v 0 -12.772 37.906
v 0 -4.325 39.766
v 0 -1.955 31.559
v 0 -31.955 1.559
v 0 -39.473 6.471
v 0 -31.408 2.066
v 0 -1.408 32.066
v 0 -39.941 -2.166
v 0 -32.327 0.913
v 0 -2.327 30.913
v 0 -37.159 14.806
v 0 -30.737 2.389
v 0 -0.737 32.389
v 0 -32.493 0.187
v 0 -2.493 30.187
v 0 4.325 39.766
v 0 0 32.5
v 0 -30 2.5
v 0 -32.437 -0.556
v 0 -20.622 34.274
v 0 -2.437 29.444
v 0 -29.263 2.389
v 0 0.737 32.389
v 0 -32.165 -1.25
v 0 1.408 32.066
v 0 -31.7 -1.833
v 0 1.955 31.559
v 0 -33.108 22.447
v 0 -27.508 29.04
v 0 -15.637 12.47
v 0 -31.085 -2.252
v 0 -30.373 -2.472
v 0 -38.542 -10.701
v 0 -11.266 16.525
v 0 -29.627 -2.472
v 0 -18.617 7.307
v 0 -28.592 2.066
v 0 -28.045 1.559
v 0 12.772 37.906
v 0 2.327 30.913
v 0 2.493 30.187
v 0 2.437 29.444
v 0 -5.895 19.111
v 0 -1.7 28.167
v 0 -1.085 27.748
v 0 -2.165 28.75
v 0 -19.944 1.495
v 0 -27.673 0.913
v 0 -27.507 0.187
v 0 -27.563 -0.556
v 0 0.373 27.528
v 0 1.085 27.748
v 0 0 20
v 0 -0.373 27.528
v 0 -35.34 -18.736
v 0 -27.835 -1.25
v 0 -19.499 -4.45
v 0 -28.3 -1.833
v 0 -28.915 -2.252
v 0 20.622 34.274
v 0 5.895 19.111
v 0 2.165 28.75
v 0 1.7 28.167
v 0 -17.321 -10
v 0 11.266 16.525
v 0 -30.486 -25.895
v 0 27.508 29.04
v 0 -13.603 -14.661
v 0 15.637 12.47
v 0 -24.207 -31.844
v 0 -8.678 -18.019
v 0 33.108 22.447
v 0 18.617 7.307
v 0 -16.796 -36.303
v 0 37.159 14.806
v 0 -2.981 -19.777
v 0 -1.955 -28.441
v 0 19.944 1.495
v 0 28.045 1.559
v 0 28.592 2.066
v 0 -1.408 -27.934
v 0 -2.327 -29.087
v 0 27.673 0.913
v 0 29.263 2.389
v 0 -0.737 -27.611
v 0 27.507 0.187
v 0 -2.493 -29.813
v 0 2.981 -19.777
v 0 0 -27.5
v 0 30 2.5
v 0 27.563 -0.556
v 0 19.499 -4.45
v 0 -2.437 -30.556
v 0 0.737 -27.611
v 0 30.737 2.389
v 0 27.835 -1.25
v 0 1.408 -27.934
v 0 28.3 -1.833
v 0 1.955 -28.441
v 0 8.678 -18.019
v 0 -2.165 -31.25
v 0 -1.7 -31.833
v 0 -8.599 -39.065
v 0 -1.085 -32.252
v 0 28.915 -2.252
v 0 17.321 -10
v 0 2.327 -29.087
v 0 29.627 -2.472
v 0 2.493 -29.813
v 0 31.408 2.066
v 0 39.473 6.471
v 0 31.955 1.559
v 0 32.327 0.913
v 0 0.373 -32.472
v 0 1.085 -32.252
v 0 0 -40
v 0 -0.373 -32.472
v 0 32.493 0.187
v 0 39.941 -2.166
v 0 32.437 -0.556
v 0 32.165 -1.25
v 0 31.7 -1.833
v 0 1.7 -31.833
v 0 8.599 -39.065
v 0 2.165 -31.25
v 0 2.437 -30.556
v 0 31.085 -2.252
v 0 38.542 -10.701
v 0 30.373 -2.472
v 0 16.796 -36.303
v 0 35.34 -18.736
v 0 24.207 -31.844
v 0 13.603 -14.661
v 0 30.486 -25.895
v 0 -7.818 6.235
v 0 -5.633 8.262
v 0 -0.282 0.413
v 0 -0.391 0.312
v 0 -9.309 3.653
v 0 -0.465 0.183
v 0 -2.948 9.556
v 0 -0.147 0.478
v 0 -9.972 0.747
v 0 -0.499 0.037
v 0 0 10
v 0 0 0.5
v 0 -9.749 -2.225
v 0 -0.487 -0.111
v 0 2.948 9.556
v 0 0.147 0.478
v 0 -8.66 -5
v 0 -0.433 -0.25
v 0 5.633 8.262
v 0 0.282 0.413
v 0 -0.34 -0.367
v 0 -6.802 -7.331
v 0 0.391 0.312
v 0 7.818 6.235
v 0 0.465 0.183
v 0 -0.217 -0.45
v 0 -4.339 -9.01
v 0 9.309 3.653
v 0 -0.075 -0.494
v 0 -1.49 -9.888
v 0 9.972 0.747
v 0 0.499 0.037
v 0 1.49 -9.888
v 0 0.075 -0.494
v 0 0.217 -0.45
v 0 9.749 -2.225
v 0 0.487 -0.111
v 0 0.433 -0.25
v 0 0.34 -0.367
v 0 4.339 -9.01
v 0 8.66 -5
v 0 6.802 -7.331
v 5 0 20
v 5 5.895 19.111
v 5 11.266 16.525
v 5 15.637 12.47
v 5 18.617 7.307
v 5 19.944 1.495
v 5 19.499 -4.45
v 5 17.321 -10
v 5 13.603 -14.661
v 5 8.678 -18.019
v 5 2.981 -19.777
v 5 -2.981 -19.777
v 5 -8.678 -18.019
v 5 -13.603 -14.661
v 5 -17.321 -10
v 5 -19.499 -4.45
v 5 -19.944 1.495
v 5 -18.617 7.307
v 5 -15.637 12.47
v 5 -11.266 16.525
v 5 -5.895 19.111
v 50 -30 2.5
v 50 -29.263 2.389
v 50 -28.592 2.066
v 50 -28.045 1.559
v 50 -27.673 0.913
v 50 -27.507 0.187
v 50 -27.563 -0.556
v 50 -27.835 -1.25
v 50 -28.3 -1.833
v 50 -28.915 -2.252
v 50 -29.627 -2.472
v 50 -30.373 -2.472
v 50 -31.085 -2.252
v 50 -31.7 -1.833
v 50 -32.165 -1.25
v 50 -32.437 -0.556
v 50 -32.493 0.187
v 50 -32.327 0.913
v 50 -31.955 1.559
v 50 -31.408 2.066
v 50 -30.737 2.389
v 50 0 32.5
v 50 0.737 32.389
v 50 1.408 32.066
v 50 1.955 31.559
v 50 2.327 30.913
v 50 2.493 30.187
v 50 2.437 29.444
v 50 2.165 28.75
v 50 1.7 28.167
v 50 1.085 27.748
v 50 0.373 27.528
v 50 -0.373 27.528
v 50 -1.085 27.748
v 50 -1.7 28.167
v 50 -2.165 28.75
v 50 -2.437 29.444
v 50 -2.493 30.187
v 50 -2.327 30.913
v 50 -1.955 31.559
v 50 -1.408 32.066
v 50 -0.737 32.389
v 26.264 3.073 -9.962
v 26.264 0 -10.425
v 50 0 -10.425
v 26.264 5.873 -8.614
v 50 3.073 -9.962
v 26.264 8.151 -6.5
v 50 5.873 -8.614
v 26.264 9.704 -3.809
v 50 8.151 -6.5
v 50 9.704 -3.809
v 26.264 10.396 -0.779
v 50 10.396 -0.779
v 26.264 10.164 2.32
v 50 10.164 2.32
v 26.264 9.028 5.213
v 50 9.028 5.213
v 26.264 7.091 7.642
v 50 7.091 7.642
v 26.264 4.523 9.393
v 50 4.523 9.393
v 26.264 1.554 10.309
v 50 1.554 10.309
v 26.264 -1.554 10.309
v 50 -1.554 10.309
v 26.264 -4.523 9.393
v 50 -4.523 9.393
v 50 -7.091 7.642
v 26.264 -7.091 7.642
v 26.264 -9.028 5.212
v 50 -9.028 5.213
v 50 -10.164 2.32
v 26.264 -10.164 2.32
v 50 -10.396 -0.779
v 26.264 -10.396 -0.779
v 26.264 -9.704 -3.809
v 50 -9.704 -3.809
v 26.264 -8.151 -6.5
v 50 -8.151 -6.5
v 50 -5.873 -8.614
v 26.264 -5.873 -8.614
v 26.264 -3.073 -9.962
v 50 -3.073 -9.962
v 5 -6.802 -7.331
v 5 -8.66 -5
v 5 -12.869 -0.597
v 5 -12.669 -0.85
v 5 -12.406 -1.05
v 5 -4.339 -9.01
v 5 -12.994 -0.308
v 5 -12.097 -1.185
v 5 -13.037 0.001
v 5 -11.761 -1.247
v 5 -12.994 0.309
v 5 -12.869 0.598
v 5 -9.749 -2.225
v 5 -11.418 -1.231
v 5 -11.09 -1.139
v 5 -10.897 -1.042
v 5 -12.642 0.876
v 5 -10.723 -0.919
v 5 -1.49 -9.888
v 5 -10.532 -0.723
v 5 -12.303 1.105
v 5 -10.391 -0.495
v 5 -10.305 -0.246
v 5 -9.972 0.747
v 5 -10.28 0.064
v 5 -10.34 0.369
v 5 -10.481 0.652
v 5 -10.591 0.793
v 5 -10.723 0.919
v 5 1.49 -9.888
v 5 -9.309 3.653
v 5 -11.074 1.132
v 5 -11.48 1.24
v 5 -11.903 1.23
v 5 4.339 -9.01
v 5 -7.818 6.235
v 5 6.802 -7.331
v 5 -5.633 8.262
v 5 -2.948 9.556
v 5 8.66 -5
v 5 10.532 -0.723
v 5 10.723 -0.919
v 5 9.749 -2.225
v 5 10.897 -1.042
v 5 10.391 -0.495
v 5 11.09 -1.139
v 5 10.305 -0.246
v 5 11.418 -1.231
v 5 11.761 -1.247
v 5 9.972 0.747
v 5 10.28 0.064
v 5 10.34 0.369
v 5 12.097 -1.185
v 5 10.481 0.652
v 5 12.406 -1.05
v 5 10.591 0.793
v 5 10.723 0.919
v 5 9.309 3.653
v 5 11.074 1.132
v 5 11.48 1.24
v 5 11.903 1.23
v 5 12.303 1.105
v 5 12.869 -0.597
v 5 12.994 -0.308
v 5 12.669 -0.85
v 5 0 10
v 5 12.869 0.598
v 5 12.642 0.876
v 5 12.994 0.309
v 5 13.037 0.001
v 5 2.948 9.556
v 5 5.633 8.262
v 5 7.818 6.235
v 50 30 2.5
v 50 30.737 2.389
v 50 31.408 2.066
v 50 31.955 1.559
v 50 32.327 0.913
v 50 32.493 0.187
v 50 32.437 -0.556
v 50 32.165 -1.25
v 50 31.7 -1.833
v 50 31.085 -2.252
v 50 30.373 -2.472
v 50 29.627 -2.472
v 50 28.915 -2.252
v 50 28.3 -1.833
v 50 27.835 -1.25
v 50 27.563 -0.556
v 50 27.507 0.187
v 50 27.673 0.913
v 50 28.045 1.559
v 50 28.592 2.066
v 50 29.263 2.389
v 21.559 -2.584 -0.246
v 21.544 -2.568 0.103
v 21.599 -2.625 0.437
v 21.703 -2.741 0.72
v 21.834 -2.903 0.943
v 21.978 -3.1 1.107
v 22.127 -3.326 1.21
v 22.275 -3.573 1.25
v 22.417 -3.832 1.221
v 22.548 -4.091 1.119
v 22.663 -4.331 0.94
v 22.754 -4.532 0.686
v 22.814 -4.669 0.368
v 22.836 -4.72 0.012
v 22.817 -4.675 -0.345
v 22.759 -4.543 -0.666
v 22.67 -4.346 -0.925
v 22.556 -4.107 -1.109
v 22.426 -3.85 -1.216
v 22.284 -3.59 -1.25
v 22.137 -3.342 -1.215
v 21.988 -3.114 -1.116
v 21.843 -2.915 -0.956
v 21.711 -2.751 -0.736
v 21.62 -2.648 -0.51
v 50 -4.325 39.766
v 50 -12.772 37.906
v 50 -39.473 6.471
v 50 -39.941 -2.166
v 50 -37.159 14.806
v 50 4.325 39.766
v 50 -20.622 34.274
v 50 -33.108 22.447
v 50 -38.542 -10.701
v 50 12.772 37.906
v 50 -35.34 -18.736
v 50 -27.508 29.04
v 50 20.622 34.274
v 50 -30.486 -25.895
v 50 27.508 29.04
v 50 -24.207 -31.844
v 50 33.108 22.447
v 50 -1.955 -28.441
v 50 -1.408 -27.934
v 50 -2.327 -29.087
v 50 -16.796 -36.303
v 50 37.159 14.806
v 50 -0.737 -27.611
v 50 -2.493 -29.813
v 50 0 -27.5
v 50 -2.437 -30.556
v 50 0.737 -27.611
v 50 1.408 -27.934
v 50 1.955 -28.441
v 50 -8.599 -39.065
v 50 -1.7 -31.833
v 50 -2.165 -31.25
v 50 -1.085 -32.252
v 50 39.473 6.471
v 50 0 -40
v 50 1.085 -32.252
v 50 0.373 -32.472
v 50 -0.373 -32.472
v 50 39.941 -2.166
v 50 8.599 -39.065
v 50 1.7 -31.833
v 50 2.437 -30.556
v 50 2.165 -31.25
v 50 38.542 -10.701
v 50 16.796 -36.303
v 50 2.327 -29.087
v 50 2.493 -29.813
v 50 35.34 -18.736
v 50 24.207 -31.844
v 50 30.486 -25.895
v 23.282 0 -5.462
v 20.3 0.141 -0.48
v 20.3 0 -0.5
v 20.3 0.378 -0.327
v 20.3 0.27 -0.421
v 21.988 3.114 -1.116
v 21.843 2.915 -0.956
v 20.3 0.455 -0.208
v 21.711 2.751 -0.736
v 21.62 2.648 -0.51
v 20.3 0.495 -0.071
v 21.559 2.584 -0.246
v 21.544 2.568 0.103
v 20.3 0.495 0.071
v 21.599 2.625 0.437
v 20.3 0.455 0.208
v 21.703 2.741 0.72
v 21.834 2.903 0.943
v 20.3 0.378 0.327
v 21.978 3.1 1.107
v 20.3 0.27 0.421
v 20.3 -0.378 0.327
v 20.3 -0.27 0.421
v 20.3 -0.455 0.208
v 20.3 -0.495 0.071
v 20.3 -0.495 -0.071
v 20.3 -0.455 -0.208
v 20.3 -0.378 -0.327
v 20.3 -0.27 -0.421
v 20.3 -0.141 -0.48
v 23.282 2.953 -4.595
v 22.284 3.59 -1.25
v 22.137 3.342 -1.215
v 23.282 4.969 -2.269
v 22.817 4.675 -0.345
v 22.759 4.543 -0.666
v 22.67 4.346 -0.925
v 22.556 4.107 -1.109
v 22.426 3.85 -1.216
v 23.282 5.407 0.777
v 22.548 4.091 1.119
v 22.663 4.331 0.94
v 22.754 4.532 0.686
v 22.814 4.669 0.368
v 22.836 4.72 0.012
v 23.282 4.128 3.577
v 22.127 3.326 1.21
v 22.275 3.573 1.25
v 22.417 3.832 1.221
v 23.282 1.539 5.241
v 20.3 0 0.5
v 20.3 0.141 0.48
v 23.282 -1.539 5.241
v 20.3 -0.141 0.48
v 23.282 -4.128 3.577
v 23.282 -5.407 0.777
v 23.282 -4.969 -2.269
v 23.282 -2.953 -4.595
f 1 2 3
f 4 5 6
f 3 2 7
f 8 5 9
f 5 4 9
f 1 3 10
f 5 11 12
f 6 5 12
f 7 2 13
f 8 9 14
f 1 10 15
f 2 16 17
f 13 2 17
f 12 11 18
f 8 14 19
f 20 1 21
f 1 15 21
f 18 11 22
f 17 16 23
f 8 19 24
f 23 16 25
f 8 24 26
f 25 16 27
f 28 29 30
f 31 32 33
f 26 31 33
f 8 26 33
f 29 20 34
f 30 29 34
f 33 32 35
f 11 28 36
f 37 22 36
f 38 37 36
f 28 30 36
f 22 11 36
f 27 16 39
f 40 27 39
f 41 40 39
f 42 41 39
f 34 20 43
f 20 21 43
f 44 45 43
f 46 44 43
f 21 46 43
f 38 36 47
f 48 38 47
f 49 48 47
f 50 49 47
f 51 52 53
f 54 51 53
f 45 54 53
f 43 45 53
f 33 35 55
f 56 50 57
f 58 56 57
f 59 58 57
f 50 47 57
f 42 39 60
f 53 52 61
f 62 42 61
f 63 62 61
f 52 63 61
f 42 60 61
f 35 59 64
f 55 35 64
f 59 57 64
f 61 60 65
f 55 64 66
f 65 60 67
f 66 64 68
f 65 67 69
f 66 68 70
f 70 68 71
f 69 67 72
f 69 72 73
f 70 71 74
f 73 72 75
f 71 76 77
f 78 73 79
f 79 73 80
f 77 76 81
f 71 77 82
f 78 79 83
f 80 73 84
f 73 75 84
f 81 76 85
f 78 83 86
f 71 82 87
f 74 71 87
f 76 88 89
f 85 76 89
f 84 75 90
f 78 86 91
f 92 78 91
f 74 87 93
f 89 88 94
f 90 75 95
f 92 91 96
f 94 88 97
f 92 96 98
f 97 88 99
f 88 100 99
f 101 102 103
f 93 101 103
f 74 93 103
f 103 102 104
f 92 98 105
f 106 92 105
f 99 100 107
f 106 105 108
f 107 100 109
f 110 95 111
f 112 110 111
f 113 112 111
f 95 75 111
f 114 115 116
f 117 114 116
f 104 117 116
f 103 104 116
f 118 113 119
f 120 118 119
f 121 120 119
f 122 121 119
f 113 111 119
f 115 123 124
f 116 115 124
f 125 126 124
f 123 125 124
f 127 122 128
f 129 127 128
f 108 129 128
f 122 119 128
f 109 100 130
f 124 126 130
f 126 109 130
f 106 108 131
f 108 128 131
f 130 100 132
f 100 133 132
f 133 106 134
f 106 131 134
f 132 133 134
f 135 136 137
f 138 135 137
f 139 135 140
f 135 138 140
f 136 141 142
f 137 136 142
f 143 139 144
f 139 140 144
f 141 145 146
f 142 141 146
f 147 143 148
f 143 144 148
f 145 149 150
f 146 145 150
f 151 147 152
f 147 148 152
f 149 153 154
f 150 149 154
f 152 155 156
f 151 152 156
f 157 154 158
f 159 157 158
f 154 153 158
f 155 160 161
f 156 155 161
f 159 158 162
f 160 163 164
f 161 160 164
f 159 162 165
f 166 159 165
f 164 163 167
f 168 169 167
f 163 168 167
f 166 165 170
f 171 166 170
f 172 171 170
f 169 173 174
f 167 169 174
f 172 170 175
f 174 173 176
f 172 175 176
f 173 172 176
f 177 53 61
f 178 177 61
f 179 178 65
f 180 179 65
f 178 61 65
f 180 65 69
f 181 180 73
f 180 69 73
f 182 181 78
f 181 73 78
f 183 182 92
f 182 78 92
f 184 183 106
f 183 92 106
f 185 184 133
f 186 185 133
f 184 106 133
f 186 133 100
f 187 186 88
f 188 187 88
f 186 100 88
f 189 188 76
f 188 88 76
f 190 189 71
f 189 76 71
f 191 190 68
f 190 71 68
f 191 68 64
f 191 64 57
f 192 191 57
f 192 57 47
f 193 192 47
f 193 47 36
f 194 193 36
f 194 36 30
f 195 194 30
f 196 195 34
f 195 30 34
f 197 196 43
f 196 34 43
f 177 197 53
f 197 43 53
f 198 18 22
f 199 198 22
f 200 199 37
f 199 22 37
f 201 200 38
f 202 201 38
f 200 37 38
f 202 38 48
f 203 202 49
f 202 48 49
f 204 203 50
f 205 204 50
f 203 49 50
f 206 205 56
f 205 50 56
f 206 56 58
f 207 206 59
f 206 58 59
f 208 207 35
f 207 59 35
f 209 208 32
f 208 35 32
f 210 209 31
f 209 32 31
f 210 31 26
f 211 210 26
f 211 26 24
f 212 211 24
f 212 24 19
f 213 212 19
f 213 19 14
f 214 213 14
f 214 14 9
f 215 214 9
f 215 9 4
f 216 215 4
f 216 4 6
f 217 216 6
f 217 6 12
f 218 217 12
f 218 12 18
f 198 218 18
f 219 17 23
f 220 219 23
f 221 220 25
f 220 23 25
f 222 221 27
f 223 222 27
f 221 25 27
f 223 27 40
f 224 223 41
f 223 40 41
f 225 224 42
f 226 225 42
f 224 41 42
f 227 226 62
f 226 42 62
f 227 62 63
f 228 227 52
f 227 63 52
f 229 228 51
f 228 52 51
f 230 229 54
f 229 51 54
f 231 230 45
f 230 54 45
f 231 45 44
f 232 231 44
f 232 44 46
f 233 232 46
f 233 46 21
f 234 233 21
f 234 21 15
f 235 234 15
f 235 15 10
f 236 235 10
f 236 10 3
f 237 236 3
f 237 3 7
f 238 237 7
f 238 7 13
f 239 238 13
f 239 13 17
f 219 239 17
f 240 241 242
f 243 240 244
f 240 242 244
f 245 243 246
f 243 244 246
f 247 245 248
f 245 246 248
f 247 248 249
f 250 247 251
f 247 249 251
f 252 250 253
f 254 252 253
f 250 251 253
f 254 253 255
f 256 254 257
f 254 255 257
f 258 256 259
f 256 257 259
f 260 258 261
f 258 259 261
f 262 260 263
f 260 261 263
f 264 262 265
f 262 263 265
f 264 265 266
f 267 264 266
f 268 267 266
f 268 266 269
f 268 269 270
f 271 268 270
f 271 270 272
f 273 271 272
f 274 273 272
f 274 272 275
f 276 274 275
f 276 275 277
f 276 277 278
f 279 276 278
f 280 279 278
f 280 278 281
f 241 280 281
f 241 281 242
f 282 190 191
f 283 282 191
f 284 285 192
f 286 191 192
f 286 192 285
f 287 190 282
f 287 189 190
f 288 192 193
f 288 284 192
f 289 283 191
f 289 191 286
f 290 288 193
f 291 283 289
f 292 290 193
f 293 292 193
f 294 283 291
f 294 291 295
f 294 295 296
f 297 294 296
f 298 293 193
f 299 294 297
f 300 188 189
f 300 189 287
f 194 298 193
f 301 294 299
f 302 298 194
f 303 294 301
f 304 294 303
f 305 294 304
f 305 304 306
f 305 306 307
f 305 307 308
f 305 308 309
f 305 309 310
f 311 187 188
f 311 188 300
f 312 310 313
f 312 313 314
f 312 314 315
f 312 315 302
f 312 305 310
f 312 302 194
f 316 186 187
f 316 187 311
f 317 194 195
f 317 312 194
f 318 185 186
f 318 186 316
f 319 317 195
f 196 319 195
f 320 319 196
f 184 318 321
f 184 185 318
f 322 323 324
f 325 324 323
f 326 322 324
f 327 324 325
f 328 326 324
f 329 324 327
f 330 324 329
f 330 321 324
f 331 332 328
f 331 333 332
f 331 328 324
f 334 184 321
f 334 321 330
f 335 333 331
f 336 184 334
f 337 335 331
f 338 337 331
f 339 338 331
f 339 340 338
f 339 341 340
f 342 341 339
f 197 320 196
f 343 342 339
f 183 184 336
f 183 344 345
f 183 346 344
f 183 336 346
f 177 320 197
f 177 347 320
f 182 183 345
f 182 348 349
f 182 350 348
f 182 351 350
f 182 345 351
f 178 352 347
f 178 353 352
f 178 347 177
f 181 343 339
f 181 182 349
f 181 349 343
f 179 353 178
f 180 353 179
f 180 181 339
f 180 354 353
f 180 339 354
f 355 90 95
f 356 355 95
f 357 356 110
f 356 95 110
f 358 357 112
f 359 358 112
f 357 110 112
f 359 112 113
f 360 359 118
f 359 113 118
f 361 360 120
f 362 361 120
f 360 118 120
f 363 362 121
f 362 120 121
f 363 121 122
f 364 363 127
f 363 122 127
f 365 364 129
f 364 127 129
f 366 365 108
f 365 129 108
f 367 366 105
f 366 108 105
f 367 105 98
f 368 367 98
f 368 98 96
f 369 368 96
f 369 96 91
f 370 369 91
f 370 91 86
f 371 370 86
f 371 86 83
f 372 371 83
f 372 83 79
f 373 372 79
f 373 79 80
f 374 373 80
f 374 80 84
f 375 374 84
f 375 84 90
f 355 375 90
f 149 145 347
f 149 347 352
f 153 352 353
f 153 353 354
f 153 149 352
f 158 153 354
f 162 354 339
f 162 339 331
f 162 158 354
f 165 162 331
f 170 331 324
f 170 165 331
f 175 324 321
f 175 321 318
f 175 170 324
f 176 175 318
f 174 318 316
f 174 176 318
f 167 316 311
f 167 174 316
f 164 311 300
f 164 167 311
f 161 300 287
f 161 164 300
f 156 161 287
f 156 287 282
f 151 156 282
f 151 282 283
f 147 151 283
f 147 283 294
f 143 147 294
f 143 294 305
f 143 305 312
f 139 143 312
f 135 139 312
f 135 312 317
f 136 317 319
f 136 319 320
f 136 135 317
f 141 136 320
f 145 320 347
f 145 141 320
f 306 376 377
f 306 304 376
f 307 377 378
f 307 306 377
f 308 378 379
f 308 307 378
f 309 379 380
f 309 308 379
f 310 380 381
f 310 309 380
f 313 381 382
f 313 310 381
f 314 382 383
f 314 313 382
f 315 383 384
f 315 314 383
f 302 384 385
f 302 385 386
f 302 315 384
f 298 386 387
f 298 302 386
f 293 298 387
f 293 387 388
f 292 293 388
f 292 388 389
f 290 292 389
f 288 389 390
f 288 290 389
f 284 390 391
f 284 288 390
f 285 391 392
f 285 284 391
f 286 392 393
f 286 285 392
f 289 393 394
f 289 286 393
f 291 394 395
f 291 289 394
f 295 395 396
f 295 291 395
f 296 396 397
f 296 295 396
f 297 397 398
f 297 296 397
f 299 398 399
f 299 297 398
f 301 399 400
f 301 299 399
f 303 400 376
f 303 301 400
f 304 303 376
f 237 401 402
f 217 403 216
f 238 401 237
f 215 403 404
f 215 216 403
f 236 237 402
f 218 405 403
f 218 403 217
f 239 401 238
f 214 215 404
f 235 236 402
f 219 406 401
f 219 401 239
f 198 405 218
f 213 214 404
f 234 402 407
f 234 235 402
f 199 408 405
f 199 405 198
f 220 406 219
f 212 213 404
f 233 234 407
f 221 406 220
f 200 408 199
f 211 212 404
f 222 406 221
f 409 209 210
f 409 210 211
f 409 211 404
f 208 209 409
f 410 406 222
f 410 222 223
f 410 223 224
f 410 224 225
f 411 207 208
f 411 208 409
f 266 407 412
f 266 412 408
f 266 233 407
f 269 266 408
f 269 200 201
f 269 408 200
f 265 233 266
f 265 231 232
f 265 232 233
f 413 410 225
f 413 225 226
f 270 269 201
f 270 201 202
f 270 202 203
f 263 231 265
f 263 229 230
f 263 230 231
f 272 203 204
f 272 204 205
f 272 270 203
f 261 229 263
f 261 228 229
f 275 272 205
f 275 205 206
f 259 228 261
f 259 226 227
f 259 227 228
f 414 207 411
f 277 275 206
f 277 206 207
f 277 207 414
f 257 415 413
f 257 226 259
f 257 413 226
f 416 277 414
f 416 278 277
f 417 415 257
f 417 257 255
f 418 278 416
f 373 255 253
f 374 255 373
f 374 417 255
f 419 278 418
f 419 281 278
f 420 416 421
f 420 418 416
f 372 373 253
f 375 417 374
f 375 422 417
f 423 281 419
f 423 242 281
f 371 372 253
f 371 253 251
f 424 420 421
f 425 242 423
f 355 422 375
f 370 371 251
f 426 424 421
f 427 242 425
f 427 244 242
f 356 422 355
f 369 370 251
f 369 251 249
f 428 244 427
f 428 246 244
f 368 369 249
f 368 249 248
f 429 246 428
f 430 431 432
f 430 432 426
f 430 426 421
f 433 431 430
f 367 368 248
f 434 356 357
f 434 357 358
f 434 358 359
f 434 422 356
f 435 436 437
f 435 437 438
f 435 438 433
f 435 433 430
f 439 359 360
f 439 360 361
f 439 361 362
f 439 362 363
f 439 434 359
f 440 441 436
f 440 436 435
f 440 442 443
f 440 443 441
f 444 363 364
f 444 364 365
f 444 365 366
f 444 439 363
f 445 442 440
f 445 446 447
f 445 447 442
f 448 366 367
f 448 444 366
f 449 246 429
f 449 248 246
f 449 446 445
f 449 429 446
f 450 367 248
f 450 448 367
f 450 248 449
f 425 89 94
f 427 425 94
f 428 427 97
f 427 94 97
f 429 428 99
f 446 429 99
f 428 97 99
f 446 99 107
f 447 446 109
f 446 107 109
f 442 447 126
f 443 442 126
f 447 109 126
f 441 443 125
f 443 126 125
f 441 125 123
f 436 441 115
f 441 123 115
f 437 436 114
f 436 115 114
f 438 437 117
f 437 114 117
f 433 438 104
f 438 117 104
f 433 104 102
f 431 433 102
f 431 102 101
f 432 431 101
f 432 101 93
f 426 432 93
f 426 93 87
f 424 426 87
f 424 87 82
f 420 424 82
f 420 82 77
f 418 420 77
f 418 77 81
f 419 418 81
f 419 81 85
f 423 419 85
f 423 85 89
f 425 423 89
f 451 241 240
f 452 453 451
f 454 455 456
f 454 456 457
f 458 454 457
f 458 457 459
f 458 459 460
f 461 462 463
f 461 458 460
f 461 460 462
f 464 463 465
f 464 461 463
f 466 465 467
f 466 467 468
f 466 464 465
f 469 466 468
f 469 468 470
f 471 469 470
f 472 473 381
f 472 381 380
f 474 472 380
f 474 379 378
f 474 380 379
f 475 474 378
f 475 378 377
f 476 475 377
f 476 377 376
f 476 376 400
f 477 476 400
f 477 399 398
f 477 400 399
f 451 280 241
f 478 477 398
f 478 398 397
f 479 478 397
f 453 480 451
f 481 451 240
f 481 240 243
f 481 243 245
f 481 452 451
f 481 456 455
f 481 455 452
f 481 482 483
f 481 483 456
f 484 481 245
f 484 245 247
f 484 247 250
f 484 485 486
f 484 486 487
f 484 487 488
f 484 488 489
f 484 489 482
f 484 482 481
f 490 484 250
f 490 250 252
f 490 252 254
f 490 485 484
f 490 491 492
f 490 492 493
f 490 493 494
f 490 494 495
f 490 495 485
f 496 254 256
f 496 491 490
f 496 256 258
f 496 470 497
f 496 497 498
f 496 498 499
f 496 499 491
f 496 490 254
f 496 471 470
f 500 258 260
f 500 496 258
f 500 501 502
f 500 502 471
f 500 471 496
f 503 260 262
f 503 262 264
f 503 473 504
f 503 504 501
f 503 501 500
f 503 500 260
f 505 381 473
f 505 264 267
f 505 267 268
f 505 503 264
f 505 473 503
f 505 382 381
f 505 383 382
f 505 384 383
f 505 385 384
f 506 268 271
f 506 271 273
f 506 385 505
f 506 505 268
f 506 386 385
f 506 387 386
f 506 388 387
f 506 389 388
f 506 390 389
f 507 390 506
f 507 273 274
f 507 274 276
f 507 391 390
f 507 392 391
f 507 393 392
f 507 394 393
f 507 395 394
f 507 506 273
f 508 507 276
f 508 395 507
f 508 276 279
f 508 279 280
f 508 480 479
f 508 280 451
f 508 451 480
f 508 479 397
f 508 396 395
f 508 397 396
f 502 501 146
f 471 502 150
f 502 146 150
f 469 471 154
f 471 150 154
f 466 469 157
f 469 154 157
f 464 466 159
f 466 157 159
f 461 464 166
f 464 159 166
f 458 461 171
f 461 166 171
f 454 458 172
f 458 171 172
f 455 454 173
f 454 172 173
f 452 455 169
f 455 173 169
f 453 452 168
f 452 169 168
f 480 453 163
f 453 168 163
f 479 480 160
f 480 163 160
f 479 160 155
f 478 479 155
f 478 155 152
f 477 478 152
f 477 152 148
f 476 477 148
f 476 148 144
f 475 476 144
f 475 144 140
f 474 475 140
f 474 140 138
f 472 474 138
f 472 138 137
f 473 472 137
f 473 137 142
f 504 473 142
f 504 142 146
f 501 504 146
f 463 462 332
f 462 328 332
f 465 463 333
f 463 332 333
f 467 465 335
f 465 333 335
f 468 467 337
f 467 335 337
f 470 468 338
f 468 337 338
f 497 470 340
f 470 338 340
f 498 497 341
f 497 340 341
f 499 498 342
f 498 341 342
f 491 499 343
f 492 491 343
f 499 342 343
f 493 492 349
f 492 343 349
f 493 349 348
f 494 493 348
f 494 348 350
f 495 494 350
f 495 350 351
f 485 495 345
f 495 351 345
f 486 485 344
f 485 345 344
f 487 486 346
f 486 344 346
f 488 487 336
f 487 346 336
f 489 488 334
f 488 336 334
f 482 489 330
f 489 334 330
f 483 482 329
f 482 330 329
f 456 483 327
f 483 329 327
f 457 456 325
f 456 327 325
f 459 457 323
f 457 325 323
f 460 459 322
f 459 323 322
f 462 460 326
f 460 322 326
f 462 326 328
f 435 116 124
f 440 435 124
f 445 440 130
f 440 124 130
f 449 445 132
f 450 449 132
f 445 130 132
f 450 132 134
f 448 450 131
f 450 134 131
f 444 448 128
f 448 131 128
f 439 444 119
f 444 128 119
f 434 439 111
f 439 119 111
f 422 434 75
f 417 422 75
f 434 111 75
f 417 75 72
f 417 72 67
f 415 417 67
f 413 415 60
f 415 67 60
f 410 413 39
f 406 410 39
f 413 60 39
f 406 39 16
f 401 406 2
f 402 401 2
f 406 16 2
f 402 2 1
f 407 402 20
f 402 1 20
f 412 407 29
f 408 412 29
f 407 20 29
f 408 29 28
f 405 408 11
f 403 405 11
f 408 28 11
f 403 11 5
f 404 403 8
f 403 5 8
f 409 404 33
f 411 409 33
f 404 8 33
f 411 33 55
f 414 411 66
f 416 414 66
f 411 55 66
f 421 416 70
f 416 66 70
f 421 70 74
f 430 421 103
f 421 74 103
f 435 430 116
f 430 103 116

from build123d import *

# Parameters (mm, degrees)
SKETCH1_R                      = 40
BOSS_EXTRUDE1_DEPTH            = 50
SKETCH2_R                      = 10.425
CUT_EXTRUDE1_DEPTH             = 30
SKETCH3_R                      = 20
SKETCH3_R_2                    = 10
CUT_EXTRUDE2_DEPTH             = 5
SKETCH5_R                      = 2.5
CUT_EXTRUDE4_DEPTH             = 76.498344353
SKETCH4_R                      = 0.5
CUT_EXTRUDE6_DEPTH             = 76.498344353
CUT_EXTRUDE7_REACH             = 77.498
SKETCH7_R                      = 1.25
CUT_EXTRUDE7_DIRECTION_2_REACH = 77.498


with BuildPart() as part:
    # Sketch1 → Boss-Extrude1 (new body)
    with BuildSketch(Plane(origin=(0, 0, 0), x_dir=(0, 0, -1), z_dir=(1, 0, 0))):
        Circle(SKETCH1_R)
    extrude(amount=BOSS_EXTRUDE1_DEPTH)

    # Sketch2 → Cut-Extrude1 (cut)
    with BuildSketch(Plane(origin=(50, 0, 0), x_dir=(0, 0, -1), z_dir=(1, 0, 0))):
        Circle(SKETCH2_R)
    extrude(amount=-CUT_EXTRUDE1_DEPTH, mode=Mode.SUBTRACT)

    # Sketch3 → Cut-Extrude2 (cut)
    with BuildSketch(Plane.ZY):
        Circle(SKETCH3_R)
        Circle(SKETCH3_R_2, mode=Mode.SUBTRACT)
    extrude(amount=-CUT_EXTRUDE2_DEPTH, mode=Mode.SUBTRACT)

    # Sketch5 → Cut-Extrude4 (cut, through all)
    with BuildSketch(Plane.ZY):
        with Locations((0, 30)):
            Circle(SKETCH5_R)
        with Locations((30, 0)):
            Circle(SKETCH5_R)
        with Locations((0, -30)):
            Circle(SKETCH5_R)
        with Locations((-30, 0)):
            Circle(SKETCH5_R)
    extrude(amount=-CUT_EXTRUDE4_DEPTH, mode=Mode.SUBTRACT)

    # Sketch8 → Revolve4 (revolve)
    with BuildSketch(Plane.XY, mode=Mode.PRIVATE) as revolve4_sk:
        Polygon((27.456013161, 12.408889724), (20.184130796, 0.306445106), (19.15133868, 0.306445106), (19.15133868, 12.408889724), align=None)
    revolve(revolve4_sk.sketch.rotate(Axis((-60.024183688, 0, 0), (1, 0, 0)), 270), axis=Axis((-60.024183688, 0, 0), (1, 0, 0)))

    # Sketch4 → Cut-Extrude6 (cut, through all)
    with BuildSketch(Plane.ZY):
        Circle(SKETCH4_R)
    extrude(amount=-CUT_EXTRUDE6_DEPTH, mode=Mode.SUBTRACT)

    # Sketch7 → Cut-Extrude7 (cut, up to next)
    with BuildSketch(Plane(origin=(0, 0, 0), x_dir=(0, 0, 1), z_dir=(-0.9063077870366495, 0.4226182617407003, 0)), mode=Mode.PRIVATE) as cut_extrude7_sk1:
        with Locations(Location((0, 12.678547852, 0), (0, 0, 258.66668262))):
            Circle(SKETCH7_R)
    cut_extrude7_tool1 = extrude(cut_extrude7_sk1.sketch, amount=-CUT_EXTRUDE7_REACH, mode=Mode.PRIVATE) & part.part
    cut_extrude7 = cut_extrude7_tool1.solids().sort_by_distance((5.358186, 11.490667, 0))[0]
    add(cut_extrude7, mode=Mode.SUBTRACT)

    # Sketch7 → Cut-Extrude7 direction 2 (cut, up to next)
    with BuildSketch(Plane(origin=(0, 0, 0), x_dir=(0, 0, 1), z_dir=(-0.9063077870366495, 0.4226182617407003, 0)), mode=Mode.PRIVATE) as cut_extrude7_direction_2_sk1:
        with Locations(Location((0, 12.678547852, 0), (0, 0, 258.66668262))):
            Circle(SKETCH7_R)
    cut_extrude7_direction_2_tool1 = extrude(cut_extrude7_direction_2_sk1.sketch, amount=CUT_EXTRUDE7_DIRECTION_2_REACH, mode=Mode.PRIVATE) & part.part
    cut_extrude7_direction_2 = cut_extrude7_direction_2_tool1.solids().sort_by_distance((5.358186, 11.490667, 0))[0]
    add(cut_extrude7_direction_2, mode=Mode.SUBTRACT)

    # Mirror1: Cut-Extrude7, Cut-Extrude7 direction 2 across plane
    add(cut_extrude7.mirror(Plane.ZX), mode=Mode.SUBTRACT)
    add(cut_extrude7_direction_2.mirror(Plane.ZX), mode=Mode.SUBTRACT)


solid = part.part
